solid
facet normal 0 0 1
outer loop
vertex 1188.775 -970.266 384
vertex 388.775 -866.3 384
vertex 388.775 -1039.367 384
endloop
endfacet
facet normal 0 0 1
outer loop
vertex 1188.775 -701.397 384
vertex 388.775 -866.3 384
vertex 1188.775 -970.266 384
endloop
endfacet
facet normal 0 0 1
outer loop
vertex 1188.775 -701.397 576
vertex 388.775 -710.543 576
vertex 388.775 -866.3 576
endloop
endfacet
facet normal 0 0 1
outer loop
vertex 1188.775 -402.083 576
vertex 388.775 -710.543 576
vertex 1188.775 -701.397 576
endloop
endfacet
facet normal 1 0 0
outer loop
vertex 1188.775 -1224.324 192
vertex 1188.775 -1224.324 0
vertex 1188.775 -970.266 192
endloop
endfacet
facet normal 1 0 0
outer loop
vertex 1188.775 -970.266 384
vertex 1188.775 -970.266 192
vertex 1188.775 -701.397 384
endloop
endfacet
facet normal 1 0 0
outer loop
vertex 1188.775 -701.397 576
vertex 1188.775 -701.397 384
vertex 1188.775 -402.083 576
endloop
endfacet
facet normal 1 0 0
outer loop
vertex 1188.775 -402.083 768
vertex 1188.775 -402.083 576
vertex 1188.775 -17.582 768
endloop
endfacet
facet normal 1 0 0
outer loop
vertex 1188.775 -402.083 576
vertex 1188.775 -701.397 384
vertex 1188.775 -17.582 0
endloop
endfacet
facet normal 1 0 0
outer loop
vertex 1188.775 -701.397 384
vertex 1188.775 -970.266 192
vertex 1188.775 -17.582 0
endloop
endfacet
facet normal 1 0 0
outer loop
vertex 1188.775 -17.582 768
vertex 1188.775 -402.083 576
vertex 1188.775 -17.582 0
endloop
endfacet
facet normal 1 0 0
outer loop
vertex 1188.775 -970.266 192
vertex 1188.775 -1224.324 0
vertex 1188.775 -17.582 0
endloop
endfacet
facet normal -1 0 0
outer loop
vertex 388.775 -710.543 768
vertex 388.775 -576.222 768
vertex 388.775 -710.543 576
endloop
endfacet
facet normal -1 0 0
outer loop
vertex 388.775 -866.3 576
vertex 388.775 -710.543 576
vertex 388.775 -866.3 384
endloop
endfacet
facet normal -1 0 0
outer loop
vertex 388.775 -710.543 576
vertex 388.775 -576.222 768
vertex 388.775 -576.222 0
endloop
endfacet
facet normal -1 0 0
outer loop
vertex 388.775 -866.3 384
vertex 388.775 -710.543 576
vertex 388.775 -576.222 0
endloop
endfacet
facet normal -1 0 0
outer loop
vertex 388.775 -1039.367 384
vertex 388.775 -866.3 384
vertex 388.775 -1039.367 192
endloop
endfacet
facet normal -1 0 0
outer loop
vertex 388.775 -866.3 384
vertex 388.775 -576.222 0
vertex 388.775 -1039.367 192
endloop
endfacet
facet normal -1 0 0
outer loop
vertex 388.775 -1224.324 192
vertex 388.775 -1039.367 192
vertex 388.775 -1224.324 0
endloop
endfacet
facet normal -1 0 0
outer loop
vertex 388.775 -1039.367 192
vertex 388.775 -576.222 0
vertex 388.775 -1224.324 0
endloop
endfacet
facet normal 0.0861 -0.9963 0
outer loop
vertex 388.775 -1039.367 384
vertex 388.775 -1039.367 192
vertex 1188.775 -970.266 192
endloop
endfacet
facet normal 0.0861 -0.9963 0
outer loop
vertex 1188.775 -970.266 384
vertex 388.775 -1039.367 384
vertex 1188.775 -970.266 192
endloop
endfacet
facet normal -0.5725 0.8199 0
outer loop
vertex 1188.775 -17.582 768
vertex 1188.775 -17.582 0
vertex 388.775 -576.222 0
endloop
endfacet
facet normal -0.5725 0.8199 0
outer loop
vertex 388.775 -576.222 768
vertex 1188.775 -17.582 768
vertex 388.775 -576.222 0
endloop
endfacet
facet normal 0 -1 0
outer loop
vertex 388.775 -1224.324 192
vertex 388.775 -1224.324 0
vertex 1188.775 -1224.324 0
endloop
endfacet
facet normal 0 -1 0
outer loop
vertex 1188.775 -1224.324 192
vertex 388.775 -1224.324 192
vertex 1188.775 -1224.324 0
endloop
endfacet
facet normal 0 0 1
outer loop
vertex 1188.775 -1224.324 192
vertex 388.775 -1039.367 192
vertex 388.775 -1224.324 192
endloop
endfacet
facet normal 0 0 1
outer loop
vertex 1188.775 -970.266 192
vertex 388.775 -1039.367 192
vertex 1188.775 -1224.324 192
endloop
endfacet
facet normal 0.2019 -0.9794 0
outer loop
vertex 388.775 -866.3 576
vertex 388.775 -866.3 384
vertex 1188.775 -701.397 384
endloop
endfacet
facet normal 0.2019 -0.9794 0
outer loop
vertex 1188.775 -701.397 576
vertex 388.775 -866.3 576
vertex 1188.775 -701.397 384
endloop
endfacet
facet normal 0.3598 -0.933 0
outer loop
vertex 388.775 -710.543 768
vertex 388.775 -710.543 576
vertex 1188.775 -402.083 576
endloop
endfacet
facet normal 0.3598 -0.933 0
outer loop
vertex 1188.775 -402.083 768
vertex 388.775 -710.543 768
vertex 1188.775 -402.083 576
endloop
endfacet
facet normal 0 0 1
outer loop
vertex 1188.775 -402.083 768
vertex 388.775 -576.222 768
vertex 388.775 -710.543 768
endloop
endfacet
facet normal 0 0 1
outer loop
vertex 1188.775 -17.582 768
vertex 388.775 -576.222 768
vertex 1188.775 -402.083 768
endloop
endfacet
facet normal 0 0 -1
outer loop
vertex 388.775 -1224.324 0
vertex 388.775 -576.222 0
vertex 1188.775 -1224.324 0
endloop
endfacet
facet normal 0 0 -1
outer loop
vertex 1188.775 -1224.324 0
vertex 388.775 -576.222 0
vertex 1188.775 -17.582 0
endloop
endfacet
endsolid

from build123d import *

# Parameters (mm, degrees)
F1_DEPTH = 192
F2_DEPTH = 384
F3_DEPTH = 576
F4_DEPTH = 768


with BuildPart() as f1:
    # F0 (on Top) → F1 (new body)
    with BuildSketch(Plane.XY):
        Polygon((1188.775452454, -1224.3236021269), (1188.775452454, -970.2663376007), (388.775452454, -1039.3673186817), (388.775452454, -1224.3236021269), align=None)
    extrude(amount=F1_DEPTH)

    # F0 (on Top) → F2 (join)
    with BuildSketch(Plane.XY):
        Polygon((1188.775452454, -970.2663376007), (1188.775452454, -701.3968009689), (388.775452454, -866.2996554468), (388.775452454, -1039.3673186817), align=None)
    extrude(amount=F2_DEPTH)

    # F0 (on Top) → F3 (join)
    with BuildSketch(Plane.XY):
        Polygon((1188.775452454, -701.3968009689), (1188.775452454, -402.0830337411), (388.775452454, -710.5429181553), (388.775452454, -866.2996554468), align=None)
    extrude(amount=F3_DEPTH)

    # F0 (on Top) → F4 (join)
    with BuildSketch(Plane.XY):
        Polygon((1188.775452454, -402.0830337411), (1188.775452454, -17.5821596523), (735.1856139678, -334.3236021269), (448.775452454, -534.3236021269), (388.775452454, -576.2215569221), (388.775452454, -710.5429181553), align=None)
    extrude(amount=F4_DEPTH)


solid = f1.part
